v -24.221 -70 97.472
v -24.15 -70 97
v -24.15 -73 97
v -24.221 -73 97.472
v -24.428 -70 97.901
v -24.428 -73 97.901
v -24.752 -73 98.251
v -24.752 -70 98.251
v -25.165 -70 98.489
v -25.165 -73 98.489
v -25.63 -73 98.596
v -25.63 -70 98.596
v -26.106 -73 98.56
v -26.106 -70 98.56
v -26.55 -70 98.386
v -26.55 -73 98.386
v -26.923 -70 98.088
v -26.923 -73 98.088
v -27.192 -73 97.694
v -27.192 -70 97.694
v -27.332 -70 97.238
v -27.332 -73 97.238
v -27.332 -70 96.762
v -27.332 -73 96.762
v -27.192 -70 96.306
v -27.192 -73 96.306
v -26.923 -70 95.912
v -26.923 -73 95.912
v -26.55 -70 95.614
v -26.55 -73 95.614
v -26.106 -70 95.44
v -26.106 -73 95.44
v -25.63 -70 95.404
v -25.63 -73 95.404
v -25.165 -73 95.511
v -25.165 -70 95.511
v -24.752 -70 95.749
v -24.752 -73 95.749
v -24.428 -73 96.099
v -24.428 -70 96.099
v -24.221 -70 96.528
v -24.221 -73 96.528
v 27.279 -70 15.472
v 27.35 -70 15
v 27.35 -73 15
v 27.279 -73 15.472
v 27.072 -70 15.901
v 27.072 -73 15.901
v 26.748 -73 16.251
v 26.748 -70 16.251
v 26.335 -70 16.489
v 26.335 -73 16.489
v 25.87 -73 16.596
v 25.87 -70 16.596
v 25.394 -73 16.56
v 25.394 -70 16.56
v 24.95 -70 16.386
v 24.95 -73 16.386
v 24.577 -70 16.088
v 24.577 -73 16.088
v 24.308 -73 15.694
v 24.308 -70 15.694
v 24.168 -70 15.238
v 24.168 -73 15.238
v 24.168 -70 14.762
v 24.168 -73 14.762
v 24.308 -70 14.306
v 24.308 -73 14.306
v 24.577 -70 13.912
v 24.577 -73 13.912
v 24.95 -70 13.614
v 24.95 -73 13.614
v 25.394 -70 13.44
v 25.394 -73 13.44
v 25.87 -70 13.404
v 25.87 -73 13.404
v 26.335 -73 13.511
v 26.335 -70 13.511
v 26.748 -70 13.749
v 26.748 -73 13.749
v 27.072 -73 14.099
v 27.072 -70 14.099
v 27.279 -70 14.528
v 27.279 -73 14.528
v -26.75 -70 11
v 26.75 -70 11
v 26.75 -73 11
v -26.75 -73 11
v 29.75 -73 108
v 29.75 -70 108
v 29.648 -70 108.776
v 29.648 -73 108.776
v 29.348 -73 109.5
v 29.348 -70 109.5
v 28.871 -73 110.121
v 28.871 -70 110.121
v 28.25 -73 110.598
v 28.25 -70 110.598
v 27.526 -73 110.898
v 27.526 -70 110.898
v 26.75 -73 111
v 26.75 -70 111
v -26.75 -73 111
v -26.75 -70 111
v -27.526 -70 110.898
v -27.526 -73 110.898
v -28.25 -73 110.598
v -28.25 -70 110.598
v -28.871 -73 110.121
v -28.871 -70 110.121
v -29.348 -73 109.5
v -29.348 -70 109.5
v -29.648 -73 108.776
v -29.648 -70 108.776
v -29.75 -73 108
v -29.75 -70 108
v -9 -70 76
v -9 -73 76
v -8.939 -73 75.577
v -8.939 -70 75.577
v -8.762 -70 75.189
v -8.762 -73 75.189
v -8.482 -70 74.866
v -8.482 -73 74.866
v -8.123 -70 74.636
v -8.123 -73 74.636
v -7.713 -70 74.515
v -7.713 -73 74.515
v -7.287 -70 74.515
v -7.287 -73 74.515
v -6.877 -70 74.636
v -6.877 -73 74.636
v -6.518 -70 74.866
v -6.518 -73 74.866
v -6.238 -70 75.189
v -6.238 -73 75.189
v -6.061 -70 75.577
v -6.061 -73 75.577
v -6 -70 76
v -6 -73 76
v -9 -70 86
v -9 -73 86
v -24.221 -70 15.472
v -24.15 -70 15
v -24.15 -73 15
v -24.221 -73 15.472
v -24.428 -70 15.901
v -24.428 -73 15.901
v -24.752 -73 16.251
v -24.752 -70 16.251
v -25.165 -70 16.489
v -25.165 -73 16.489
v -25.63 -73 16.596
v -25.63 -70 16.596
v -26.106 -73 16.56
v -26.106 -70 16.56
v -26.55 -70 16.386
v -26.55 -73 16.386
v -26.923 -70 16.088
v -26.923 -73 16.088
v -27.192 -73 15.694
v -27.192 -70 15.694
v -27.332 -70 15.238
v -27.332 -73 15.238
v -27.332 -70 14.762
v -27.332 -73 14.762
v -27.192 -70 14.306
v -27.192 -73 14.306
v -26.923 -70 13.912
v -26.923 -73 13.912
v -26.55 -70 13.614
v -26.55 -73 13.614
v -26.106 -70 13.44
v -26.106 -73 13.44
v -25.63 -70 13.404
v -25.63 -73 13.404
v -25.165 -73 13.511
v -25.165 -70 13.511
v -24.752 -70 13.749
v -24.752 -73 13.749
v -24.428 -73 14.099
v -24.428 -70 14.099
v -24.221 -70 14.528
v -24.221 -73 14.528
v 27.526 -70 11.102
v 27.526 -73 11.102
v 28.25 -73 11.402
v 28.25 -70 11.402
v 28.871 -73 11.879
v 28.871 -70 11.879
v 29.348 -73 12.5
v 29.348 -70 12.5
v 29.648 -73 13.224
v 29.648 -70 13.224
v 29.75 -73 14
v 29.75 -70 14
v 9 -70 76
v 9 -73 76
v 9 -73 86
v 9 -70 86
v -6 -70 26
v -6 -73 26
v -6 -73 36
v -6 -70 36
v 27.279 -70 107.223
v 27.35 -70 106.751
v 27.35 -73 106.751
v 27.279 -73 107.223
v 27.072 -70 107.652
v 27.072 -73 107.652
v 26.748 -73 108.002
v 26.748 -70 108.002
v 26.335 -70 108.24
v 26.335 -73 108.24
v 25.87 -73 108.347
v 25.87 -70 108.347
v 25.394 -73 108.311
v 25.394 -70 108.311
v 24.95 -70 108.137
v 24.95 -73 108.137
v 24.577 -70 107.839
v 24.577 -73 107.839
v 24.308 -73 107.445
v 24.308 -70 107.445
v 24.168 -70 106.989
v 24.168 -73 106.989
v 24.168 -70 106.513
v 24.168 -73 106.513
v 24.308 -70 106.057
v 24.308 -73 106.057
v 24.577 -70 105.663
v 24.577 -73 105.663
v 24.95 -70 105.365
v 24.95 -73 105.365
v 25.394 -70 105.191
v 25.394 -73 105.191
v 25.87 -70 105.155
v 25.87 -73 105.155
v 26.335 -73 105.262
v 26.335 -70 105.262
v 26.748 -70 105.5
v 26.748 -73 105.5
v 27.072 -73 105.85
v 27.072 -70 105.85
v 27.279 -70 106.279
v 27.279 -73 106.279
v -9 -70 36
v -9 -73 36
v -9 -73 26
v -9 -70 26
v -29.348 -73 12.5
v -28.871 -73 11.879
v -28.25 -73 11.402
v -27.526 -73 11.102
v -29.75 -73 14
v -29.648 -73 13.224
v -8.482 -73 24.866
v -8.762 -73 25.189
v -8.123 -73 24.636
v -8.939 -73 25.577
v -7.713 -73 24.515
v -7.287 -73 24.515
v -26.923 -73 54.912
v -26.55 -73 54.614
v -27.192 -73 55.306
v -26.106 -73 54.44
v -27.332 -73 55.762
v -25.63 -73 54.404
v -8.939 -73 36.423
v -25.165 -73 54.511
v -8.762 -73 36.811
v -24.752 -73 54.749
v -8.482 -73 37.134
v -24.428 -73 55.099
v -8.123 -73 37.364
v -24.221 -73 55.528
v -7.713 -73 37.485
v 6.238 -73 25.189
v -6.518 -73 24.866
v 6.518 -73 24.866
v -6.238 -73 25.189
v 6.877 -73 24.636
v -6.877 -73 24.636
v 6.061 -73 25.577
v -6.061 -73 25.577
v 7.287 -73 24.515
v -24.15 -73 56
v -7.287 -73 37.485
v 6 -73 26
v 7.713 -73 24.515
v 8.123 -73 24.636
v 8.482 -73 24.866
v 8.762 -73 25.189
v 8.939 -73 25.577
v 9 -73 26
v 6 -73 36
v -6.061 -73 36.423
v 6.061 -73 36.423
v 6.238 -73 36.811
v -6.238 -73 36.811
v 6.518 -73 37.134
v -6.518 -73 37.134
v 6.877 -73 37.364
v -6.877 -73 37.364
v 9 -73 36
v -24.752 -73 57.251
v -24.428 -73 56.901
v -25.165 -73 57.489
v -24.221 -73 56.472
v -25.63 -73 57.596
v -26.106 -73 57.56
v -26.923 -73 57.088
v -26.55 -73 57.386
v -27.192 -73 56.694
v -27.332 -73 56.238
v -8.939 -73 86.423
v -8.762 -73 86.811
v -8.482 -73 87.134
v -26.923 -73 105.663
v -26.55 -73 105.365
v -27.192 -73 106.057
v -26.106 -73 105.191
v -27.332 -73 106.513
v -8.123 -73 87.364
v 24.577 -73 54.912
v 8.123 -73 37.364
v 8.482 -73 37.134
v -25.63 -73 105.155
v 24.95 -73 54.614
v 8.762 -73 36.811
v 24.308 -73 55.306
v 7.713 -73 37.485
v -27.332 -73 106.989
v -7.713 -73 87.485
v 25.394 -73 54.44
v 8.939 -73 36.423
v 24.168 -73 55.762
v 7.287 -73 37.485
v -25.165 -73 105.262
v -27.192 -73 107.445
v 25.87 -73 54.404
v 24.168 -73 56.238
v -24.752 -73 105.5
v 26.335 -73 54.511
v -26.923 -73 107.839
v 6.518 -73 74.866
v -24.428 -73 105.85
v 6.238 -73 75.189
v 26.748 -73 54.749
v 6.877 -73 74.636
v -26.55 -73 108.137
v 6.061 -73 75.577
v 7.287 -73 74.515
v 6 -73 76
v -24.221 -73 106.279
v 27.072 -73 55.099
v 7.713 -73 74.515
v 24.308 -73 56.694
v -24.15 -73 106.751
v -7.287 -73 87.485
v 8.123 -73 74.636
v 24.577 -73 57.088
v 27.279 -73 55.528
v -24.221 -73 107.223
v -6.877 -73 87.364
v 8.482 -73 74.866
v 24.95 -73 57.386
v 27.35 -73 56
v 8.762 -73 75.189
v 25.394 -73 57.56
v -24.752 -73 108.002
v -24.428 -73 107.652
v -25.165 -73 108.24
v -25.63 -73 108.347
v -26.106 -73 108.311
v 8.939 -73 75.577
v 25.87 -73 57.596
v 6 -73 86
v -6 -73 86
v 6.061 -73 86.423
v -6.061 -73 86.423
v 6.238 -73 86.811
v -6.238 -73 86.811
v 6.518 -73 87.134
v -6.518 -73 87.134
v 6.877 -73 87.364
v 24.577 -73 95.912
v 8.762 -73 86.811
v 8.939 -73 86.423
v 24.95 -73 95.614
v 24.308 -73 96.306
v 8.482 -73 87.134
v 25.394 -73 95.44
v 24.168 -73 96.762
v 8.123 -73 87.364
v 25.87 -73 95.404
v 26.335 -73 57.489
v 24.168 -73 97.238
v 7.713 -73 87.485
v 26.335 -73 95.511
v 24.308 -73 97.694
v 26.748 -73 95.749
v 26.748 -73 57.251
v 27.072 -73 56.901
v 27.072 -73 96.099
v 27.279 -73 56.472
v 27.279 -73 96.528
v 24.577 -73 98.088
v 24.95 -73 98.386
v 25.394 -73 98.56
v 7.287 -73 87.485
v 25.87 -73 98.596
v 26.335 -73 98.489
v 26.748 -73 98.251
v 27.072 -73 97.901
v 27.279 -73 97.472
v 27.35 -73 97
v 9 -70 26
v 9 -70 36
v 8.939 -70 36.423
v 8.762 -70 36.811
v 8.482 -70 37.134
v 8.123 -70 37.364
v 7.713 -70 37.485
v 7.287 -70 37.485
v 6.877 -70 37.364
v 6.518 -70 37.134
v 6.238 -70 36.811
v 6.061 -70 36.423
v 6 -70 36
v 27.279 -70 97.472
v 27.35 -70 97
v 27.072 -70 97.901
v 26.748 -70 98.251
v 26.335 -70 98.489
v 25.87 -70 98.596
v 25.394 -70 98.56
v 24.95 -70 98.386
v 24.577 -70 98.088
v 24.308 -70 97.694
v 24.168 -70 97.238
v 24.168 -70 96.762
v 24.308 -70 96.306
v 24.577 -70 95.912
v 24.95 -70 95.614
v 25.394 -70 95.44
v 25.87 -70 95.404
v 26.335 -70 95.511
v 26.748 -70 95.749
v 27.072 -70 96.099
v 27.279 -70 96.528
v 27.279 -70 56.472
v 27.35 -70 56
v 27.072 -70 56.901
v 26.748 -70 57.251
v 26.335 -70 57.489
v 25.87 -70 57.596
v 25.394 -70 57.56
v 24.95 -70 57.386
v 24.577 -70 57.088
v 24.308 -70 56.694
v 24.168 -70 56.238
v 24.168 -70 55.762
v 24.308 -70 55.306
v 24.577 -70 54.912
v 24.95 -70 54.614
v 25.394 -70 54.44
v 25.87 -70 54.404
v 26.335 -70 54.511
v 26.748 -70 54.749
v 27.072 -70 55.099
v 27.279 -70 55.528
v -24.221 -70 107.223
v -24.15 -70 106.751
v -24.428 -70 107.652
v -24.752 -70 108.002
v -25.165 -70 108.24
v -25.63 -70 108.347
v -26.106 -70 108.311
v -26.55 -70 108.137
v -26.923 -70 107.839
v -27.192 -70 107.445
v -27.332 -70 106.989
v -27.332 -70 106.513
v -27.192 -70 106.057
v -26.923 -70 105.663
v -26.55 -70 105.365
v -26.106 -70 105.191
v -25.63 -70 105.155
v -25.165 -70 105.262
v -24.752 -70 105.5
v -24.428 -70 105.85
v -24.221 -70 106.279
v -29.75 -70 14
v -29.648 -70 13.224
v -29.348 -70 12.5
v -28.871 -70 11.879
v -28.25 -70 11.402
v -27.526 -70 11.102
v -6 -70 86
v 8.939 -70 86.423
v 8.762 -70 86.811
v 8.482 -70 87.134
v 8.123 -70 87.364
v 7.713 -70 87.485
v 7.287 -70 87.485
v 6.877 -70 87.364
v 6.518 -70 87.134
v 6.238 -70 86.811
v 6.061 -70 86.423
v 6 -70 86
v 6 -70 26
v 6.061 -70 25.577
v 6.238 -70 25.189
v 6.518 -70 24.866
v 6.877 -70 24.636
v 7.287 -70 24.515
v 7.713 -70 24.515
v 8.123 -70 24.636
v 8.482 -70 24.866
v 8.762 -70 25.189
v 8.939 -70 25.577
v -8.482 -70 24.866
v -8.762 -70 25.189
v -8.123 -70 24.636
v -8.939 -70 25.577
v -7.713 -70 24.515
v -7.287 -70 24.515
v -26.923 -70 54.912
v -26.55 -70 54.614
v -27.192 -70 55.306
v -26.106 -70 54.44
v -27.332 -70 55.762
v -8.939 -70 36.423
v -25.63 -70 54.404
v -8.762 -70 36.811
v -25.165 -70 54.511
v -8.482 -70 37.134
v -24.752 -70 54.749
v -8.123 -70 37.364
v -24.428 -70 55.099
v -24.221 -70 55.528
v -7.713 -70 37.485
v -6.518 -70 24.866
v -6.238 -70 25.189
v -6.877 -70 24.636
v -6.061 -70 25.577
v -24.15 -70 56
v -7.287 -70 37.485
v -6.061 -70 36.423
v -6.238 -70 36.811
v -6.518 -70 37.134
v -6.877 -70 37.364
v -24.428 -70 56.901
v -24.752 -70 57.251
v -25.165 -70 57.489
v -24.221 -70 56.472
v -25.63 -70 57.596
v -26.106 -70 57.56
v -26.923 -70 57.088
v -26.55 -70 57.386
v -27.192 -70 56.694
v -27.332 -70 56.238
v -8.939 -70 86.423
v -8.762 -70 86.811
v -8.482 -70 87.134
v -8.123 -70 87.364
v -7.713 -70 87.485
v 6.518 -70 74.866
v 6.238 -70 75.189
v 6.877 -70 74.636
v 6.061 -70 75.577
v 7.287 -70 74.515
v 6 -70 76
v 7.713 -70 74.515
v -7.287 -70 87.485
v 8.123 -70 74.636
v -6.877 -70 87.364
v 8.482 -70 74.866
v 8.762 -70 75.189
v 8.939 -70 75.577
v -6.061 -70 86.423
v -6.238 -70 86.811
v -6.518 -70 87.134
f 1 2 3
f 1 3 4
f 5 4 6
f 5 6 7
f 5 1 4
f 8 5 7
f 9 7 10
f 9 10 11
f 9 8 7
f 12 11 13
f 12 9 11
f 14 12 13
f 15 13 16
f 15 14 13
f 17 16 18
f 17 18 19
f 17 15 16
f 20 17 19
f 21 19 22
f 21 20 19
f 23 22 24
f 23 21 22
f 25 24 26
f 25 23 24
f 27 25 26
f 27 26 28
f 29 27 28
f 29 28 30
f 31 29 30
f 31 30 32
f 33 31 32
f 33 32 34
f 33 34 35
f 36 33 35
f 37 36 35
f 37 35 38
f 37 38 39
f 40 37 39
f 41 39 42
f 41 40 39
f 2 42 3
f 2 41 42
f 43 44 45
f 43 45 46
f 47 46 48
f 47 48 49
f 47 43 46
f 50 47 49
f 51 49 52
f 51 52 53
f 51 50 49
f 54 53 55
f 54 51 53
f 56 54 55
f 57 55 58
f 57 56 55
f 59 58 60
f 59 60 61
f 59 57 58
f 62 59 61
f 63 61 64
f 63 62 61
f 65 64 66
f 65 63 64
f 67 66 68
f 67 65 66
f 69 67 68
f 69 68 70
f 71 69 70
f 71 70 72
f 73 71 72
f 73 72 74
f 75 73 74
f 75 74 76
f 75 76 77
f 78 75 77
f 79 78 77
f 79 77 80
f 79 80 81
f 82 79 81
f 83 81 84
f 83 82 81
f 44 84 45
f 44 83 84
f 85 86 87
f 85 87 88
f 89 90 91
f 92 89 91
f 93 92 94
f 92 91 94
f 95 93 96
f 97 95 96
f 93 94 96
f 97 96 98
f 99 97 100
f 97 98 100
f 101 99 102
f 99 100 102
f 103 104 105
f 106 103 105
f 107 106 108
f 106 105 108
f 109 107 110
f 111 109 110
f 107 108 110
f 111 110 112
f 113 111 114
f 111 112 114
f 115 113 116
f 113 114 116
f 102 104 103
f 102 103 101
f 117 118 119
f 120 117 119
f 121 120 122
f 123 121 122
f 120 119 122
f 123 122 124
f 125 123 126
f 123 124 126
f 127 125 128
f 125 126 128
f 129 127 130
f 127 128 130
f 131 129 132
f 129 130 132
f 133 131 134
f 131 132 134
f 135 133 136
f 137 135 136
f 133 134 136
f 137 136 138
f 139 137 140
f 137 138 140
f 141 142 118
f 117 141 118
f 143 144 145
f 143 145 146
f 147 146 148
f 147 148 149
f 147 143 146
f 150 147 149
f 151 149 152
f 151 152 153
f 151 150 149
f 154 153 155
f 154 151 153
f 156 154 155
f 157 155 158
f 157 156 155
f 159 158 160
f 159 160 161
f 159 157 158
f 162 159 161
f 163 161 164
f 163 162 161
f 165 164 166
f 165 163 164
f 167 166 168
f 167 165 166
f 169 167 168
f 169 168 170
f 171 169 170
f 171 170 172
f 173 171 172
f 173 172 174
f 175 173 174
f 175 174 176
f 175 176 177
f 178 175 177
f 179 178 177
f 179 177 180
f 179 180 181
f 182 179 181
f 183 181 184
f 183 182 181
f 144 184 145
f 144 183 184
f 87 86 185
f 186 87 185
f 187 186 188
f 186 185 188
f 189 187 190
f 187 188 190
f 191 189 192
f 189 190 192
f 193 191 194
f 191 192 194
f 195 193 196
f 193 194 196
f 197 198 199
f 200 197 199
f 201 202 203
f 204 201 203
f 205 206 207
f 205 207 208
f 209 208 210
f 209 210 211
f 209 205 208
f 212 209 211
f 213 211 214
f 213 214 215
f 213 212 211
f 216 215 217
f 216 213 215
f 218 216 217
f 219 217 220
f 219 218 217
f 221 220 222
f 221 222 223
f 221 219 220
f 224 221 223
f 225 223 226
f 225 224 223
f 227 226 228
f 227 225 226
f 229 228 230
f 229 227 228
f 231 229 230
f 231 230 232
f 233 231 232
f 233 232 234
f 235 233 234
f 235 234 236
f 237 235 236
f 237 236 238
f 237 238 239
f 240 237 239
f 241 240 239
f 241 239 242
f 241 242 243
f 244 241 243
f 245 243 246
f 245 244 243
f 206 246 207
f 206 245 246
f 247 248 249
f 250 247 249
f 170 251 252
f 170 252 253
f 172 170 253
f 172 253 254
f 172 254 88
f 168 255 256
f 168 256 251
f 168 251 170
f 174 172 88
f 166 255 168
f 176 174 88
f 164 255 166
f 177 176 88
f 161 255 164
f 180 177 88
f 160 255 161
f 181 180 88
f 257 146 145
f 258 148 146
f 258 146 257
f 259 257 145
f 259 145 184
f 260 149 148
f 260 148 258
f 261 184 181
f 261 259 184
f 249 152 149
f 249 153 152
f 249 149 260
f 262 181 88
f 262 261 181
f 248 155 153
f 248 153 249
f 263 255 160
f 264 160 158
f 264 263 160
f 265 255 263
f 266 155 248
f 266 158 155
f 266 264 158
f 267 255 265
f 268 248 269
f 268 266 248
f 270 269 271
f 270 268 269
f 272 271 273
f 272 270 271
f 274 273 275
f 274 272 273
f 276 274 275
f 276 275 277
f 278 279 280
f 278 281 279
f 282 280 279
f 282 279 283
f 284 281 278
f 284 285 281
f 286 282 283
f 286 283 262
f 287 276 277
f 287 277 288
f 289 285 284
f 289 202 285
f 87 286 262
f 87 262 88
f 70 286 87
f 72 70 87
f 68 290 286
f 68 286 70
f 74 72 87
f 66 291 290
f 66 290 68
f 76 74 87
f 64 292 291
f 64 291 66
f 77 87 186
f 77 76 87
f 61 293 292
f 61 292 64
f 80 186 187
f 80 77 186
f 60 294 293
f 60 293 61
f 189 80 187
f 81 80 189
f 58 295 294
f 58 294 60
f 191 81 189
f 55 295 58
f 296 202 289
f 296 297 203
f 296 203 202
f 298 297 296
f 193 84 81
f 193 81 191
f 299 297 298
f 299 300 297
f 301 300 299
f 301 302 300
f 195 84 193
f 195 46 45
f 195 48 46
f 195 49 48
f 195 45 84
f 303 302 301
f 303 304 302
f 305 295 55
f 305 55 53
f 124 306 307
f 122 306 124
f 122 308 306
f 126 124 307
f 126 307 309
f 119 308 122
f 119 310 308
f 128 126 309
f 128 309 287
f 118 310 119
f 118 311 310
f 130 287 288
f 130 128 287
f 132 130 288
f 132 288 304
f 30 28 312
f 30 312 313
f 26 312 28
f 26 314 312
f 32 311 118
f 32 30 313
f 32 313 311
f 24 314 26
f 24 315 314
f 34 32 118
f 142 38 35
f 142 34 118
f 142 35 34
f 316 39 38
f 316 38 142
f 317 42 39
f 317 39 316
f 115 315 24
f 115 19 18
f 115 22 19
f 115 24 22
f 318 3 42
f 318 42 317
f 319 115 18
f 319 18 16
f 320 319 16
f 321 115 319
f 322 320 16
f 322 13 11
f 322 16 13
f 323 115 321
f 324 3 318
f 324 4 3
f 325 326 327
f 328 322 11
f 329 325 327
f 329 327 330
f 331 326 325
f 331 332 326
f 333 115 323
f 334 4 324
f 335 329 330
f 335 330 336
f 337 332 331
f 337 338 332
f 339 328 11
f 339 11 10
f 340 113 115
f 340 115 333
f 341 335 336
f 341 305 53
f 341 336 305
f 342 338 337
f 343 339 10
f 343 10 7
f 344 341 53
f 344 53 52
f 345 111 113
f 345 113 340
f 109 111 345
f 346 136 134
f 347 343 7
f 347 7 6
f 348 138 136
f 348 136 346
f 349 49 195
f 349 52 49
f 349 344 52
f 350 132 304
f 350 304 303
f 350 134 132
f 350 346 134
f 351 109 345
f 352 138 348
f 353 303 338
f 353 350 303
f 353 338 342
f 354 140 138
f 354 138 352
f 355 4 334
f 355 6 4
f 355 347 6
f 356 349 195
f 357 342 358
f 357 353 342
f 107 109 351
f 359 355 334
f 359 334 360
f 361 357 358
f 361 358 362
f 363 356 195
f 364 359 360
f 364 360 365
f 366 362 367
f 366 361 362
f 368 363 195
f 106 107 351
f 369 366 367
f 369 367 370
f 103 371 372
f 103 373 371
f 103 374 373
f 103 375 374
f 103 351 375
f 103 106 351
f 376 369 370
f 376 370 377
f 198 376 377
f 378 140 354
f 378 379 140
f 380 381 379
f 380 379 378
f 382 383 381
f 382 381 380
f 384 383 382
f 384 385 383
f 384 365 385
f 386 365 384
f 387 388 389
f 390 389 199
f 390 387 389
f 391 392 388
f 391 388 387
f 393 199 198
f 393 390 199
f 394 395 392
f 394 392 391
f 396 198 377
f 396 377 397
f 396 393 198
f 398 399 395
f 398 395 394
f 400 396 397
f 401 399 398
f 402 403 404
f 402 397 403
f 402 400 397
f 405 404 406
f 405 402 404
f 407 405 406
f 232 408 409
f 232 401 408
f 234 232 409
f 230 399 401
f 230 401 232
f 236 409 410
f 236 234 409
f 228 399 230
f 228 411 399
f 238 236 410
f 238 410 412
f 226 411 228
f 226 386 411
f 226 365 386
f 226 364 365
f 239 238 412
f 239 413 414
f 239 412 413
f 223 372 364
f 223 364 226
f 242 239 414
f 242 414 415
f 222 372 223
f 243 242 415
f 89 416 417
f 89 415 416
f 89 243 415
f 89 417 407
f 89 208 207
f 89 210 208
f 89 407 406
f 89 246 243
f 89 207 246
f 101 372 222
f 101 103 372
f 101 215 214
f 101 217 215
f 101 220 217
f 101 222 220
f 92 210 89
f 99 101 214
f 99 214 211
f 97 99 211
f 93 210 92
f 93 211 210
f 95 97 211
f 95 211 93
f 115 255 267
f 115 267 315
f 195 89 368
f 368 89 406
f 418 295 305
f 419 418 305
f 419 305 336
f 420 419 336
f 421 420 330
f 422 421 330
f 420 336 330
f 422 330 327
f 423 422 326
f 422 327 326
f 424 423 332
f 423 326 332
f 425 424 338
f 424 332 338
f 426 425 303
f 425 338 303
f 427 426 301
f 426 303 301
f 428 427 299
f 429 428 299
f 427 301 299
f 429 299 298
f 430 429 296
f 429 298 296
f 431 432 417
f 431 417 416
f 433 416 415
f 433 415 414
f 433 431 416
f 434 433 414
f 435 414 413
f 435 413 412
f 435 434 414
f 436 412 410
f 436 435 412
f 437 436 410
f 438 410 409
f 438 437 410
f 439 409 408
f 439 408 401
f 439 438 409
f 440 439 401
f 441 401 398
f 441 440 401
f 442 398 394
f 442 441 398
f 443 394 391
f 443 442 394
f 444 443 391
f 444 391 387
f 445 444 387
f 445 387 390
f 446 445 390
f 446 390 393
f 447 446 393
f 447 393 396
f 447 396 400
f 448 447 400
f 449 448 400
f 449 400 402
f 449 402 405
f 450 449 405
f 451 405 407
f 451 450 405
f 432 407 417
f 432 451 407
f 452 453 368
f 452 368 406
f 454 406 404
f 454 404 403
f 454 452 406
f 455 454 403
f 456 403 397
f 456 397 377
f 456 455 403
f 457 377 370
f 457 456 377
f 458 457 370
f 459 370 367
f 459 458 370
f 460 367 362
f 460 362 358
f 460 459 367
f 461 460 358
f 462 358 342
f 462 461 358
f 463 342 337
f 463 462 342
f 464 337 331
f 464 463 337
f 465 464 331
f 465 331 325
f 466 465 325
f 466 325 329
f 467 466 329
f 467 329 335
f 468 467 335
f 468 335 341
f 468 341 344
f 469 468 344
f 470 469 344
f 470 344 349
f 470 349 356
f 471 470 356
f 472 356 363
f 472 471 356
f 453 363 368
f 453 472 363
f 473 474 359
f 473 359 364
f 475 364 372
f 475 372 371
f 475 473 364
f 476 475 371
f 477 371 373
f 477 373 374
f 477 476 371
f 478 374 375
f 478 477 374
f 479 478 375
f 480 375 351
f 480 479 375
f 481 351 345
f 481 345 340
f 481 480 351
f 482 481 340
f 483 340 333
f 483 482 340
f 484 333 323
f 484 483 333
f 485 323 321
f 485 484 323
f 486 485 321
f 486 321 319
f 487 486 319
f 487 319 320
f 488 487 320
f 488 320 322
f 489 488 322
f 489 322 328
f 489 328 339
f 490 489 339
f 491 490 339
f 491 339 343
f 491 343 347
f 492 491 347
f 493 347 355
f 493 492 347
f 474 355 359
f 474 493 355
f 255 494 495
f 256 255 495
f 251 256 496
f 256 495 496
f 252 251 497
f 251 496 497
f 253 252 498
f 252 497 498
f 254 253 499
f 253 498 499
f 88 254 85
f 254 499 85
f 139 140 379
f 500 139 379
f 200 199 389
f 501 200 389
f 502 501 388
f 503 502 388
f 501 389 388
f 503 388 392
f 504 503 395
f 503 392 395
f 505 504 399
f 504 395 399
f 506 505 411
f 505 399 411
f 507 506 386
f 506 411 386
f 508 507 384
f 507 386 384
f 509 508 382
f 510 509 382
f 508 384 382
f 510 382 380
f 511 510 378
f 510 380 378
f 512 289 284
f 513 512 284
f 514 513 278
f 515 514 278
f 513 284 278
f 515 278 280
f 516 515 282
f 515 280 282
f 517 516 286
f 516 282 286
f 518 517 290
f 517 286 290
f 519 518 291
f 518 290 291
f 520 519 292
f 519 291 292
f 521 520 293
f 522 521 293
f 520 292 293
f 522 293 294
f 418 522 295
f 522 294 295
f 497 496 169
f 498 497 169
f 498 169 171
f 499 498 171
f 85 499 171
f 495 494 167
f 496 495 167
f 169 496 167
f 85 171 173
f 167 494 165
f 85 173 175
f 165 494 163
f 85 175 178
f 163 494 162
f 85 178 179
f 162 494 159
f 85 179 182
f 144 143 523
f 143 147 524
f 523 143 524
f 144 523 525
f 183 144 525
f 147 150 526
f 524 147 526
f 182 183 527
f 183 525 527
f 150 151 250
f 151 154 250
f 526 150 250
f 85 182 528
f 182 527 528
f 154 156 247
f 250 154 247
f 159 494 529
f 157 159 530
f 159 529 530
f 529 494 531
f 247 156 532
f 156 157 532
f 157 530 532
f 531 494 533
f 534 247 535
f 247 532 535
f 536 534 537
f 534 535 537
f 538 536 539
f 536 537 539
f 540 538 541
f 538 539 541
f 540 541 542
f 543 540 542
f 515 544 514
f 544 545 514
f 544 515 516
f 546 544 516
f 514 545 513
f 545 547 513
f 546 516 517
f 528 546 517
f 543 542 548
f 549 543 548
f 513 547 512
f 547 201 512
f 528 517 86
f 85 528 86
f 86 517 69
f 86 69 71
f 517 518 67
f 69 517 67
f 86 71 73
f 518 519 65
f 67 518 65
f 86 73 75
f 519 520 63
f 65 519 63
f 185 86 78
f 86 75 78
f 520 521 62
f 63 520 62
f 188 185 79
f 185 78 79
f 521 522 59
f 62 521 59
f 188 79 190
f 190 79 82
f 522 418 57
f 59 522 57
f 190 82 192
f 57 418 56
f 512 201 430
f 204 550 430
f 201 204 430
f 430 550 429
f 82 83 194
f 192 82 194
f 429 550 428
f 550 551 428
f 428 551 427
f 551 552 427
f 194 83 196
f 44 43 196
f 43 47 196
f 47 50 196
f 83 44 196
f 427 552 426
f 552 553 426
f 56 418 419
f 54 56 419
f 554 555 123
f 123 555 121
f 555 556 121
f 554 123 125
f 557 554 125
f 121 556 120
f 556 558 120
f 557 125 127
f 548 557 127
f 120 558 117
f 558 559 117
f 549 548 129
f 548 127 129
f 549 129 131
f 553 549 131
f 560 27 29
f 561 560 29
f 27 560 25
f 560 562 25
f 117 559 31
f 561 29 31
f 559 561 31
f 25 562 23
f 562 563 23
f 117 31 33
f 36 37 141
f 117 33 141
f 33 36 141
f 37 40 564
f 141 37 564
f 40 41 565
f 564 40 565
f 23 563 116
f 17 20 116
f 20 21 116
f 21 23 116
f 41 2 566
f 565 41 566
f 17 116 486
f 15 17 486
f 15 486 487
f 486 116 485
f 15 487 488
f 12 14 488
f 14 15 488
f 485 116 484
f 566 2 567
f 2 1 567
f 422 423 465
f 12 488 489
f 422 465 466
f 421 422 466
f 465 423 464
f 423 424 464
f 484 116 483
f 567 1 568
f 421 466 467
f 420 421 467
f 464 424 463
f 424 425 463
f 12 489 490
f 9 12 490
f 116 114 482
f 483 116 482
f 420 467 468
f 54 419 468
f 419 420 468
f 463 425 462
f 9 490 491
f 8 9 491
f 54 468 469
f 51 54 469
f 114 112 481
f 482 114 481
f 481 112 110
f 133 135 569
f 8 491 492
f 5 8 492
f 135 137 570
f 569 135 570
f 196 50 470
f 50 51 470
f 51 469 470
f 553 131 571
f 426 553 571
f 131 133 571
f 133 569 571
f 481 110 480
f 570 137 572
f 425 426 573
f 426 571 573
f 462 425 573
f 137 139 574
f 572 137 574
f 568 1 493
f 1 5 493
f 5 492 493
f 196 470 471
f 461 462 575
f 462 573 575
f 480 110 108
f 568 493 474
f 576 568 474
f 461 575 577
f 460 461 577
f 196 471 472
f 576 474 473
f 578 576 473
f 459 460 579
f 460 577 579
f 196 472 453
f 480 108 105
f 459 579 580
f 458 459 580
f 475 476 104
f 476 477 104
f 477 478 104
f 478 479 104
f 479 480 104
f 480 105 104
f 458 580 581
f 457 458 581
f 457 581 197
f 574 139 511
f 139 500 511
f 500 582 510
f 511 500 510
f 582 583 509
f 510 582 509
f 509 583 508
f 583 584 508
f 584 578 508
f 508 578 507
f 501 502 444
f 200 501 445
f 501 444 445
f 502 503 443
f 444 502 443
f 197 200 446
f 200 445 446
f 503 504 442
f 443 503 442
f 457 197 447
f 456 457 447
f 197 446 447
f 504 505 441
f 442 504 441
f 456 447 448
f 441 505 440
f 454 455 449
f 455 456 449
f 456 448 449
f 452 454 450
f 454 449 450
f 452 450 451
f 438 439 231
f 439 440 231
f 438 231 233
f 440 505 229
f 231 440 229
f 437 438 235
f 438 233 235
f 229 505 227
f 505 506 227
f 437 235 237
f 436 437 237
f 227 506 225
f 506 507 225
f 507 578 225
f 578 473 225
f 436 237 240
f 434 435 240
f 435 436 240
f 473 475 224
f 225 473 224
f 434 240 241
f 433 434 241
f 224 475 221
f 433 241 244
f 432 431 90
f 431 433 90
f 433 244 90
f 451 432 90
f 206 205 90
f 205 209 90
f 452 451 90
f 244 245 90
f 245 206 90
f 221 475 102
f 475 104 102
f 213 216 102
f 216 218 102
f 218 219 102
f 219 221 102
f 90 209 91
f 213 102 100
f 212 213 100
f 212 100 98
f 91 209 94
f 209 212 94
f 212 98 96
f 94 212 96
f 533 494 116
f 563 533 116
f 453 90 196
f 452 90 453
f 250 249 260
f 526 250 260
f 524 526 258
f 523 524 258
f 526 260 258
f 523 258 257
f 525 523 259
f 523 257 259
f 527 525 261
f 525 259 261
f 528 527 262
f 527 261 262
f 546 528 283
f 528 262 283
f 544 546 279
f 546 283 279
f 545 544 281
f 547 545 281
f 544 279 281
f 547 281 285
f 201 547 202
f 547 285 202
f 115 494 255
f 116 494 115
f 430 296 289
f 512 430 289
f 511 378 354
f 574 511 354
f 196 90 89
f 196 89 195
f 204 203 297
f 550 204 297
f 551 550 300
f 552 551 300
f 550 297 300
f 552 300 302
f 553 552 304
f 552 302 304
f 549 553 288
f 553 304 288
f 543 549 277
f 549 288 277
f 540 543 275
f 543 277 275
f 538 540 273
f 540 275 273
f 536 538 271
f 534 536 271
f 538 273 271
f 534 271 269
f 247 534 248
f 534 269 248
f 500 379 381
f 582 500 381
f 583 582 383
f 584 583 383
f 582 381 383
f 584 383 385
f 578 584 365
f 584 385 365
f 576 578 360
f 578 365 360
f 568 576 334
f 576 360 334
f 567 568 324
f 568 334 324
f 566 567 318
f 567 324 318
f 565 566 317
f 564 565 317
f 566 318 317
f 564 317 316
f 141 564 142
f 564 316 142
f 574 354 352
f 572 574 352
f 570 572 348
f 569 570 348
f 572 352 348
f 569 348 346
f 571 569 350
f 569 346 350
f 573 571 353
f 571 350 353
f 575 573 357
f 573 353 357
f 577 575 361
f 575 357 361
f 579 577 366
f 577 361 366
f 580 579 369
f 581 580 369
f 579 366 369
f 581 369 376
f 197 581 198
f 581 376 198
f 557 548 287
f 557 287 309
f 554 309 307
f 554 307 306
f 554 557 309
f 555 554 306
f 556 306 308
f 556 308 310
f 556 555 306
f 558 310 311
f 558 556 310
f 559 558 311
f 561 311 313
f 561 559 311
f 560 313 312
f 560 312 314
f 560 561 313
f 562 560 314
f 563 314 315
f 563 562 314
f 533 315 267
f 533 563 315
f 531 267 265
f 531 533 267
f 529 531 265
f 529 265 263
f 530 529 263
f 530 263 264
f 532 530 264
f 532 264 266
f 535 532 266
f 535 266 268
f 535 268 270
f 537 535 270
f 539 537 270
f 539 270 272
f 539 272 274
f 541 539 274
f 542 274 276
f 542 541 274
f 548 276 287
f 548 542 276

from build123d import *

# Parameters (mm, degrees)
SKETCH014_R         = 1.6
PAD004_DEPTH        = 3
POCKET011_DEPTH     = 3.00101
LINEARPATTERN_COUNT = 2
LINEARPATTERN_PITCH = 50


with BuildPart() as part:
    # Sketch014 (on Binder) → Pad004 (new body)
    with BuildSketch(Plane(origin=(1.2e-05, -70, 0), x_dir=(1, 0, 0), z_dir=(0, -1, 0))):
        with BuildLine():
            ThreePointArc((-26.75, 111), (-28.87132, 110.12132), (-29.75, 108))
            Line((-29.75, 14), (-29.75, 108))
            ThreePointArc((-29.75, 14), (-28.87132, 11.87868), (-26.75, 11))
            Line((26.75, 11), (-26.75, 11))
            ThreePointArc((26.75, 11), (28.87132, 11.87868), (29.75, 14))
            Line((29.75, 108), (29.75, 14))
            ThreePointArc((29.75, 108), (28.87132, 110.12132), (26.75, 111))
            Line((-26.75, 111), (26.75, 111))
        make_face()
        with Locations((-25.75, 97)):
            Circle(SKETCH014_R, mode=Mode.SUBTRACT)
        with Locations((25.75, 97)):
            Circle(SKETCH014_R, mode=Mode.SUBTRACT)
        with Locations((25.75, 56)):
            Circle(SKETCH014_R, mode=Mode.SUBTRACT)
        with Locations((-25.75, 56)):
            Circle(SKETCH014_R, mode=Mode.SUBTRACT)
        with Locations((-25.75, 15)):
            Circle(SKETCH014_R, mode=Mode.SUBTRACT)
        with Locations((25.75, 15)):
            Circle(SKETCH014_R, mode=Mode.SUBTRACT)
        with Locations((-25.75, 106.751)):
            Circle(SKETCH014_R, mode=Mode.SUBTRACT)
        with Locations((25.75, 106.751)):
            Circle(SKETCH014_R, mode=Mode.SUBTRACT)
    extrude(amount=PAD004_DEPTH)

    # Sketch019 (on Face18 of Pad004) → Pocket011 (cut, through all)
    with BuildSketch(Plane(origin=(1.2e-05, -73, 0), x_dir=(1, 0, 0), z_dir=(0, -1, 0))):
        with BuildLine():
            ThreePointArc((-6, 86), (-7.5, 87.5), (-9, 86))
            Line((-9, 86), (-9, 76))
            ThreePointArc((-9, 76), (-7.5, 74.5), (-6, 76))
            Line((-6, 76), (-6, 86))
        make_face()
        with BuildLine():
            ThreePointArc((9, 86), (7.5, 87.5), (6, 86))
            Line((6, 86), (6, 76))
            ThreePointArc((6, 76), (7.5, 74.5), (9, 76))
            Line((9, 76), (9, 86))
        make_face()
    pocket011 = extrude(amount=-POCKET011_DEPTH, mode=Mode.SUBTRACT)

    # LinearPattern: Pocket011 ×2
    with Locations(*[(0, 0, -i * LINEARPATTERN_PITCH) for i in range(1, LINEARPATTERN_COUNT)]):
        add(pocket011, mode=Mode.SUBTRACT)


solid = part.part
